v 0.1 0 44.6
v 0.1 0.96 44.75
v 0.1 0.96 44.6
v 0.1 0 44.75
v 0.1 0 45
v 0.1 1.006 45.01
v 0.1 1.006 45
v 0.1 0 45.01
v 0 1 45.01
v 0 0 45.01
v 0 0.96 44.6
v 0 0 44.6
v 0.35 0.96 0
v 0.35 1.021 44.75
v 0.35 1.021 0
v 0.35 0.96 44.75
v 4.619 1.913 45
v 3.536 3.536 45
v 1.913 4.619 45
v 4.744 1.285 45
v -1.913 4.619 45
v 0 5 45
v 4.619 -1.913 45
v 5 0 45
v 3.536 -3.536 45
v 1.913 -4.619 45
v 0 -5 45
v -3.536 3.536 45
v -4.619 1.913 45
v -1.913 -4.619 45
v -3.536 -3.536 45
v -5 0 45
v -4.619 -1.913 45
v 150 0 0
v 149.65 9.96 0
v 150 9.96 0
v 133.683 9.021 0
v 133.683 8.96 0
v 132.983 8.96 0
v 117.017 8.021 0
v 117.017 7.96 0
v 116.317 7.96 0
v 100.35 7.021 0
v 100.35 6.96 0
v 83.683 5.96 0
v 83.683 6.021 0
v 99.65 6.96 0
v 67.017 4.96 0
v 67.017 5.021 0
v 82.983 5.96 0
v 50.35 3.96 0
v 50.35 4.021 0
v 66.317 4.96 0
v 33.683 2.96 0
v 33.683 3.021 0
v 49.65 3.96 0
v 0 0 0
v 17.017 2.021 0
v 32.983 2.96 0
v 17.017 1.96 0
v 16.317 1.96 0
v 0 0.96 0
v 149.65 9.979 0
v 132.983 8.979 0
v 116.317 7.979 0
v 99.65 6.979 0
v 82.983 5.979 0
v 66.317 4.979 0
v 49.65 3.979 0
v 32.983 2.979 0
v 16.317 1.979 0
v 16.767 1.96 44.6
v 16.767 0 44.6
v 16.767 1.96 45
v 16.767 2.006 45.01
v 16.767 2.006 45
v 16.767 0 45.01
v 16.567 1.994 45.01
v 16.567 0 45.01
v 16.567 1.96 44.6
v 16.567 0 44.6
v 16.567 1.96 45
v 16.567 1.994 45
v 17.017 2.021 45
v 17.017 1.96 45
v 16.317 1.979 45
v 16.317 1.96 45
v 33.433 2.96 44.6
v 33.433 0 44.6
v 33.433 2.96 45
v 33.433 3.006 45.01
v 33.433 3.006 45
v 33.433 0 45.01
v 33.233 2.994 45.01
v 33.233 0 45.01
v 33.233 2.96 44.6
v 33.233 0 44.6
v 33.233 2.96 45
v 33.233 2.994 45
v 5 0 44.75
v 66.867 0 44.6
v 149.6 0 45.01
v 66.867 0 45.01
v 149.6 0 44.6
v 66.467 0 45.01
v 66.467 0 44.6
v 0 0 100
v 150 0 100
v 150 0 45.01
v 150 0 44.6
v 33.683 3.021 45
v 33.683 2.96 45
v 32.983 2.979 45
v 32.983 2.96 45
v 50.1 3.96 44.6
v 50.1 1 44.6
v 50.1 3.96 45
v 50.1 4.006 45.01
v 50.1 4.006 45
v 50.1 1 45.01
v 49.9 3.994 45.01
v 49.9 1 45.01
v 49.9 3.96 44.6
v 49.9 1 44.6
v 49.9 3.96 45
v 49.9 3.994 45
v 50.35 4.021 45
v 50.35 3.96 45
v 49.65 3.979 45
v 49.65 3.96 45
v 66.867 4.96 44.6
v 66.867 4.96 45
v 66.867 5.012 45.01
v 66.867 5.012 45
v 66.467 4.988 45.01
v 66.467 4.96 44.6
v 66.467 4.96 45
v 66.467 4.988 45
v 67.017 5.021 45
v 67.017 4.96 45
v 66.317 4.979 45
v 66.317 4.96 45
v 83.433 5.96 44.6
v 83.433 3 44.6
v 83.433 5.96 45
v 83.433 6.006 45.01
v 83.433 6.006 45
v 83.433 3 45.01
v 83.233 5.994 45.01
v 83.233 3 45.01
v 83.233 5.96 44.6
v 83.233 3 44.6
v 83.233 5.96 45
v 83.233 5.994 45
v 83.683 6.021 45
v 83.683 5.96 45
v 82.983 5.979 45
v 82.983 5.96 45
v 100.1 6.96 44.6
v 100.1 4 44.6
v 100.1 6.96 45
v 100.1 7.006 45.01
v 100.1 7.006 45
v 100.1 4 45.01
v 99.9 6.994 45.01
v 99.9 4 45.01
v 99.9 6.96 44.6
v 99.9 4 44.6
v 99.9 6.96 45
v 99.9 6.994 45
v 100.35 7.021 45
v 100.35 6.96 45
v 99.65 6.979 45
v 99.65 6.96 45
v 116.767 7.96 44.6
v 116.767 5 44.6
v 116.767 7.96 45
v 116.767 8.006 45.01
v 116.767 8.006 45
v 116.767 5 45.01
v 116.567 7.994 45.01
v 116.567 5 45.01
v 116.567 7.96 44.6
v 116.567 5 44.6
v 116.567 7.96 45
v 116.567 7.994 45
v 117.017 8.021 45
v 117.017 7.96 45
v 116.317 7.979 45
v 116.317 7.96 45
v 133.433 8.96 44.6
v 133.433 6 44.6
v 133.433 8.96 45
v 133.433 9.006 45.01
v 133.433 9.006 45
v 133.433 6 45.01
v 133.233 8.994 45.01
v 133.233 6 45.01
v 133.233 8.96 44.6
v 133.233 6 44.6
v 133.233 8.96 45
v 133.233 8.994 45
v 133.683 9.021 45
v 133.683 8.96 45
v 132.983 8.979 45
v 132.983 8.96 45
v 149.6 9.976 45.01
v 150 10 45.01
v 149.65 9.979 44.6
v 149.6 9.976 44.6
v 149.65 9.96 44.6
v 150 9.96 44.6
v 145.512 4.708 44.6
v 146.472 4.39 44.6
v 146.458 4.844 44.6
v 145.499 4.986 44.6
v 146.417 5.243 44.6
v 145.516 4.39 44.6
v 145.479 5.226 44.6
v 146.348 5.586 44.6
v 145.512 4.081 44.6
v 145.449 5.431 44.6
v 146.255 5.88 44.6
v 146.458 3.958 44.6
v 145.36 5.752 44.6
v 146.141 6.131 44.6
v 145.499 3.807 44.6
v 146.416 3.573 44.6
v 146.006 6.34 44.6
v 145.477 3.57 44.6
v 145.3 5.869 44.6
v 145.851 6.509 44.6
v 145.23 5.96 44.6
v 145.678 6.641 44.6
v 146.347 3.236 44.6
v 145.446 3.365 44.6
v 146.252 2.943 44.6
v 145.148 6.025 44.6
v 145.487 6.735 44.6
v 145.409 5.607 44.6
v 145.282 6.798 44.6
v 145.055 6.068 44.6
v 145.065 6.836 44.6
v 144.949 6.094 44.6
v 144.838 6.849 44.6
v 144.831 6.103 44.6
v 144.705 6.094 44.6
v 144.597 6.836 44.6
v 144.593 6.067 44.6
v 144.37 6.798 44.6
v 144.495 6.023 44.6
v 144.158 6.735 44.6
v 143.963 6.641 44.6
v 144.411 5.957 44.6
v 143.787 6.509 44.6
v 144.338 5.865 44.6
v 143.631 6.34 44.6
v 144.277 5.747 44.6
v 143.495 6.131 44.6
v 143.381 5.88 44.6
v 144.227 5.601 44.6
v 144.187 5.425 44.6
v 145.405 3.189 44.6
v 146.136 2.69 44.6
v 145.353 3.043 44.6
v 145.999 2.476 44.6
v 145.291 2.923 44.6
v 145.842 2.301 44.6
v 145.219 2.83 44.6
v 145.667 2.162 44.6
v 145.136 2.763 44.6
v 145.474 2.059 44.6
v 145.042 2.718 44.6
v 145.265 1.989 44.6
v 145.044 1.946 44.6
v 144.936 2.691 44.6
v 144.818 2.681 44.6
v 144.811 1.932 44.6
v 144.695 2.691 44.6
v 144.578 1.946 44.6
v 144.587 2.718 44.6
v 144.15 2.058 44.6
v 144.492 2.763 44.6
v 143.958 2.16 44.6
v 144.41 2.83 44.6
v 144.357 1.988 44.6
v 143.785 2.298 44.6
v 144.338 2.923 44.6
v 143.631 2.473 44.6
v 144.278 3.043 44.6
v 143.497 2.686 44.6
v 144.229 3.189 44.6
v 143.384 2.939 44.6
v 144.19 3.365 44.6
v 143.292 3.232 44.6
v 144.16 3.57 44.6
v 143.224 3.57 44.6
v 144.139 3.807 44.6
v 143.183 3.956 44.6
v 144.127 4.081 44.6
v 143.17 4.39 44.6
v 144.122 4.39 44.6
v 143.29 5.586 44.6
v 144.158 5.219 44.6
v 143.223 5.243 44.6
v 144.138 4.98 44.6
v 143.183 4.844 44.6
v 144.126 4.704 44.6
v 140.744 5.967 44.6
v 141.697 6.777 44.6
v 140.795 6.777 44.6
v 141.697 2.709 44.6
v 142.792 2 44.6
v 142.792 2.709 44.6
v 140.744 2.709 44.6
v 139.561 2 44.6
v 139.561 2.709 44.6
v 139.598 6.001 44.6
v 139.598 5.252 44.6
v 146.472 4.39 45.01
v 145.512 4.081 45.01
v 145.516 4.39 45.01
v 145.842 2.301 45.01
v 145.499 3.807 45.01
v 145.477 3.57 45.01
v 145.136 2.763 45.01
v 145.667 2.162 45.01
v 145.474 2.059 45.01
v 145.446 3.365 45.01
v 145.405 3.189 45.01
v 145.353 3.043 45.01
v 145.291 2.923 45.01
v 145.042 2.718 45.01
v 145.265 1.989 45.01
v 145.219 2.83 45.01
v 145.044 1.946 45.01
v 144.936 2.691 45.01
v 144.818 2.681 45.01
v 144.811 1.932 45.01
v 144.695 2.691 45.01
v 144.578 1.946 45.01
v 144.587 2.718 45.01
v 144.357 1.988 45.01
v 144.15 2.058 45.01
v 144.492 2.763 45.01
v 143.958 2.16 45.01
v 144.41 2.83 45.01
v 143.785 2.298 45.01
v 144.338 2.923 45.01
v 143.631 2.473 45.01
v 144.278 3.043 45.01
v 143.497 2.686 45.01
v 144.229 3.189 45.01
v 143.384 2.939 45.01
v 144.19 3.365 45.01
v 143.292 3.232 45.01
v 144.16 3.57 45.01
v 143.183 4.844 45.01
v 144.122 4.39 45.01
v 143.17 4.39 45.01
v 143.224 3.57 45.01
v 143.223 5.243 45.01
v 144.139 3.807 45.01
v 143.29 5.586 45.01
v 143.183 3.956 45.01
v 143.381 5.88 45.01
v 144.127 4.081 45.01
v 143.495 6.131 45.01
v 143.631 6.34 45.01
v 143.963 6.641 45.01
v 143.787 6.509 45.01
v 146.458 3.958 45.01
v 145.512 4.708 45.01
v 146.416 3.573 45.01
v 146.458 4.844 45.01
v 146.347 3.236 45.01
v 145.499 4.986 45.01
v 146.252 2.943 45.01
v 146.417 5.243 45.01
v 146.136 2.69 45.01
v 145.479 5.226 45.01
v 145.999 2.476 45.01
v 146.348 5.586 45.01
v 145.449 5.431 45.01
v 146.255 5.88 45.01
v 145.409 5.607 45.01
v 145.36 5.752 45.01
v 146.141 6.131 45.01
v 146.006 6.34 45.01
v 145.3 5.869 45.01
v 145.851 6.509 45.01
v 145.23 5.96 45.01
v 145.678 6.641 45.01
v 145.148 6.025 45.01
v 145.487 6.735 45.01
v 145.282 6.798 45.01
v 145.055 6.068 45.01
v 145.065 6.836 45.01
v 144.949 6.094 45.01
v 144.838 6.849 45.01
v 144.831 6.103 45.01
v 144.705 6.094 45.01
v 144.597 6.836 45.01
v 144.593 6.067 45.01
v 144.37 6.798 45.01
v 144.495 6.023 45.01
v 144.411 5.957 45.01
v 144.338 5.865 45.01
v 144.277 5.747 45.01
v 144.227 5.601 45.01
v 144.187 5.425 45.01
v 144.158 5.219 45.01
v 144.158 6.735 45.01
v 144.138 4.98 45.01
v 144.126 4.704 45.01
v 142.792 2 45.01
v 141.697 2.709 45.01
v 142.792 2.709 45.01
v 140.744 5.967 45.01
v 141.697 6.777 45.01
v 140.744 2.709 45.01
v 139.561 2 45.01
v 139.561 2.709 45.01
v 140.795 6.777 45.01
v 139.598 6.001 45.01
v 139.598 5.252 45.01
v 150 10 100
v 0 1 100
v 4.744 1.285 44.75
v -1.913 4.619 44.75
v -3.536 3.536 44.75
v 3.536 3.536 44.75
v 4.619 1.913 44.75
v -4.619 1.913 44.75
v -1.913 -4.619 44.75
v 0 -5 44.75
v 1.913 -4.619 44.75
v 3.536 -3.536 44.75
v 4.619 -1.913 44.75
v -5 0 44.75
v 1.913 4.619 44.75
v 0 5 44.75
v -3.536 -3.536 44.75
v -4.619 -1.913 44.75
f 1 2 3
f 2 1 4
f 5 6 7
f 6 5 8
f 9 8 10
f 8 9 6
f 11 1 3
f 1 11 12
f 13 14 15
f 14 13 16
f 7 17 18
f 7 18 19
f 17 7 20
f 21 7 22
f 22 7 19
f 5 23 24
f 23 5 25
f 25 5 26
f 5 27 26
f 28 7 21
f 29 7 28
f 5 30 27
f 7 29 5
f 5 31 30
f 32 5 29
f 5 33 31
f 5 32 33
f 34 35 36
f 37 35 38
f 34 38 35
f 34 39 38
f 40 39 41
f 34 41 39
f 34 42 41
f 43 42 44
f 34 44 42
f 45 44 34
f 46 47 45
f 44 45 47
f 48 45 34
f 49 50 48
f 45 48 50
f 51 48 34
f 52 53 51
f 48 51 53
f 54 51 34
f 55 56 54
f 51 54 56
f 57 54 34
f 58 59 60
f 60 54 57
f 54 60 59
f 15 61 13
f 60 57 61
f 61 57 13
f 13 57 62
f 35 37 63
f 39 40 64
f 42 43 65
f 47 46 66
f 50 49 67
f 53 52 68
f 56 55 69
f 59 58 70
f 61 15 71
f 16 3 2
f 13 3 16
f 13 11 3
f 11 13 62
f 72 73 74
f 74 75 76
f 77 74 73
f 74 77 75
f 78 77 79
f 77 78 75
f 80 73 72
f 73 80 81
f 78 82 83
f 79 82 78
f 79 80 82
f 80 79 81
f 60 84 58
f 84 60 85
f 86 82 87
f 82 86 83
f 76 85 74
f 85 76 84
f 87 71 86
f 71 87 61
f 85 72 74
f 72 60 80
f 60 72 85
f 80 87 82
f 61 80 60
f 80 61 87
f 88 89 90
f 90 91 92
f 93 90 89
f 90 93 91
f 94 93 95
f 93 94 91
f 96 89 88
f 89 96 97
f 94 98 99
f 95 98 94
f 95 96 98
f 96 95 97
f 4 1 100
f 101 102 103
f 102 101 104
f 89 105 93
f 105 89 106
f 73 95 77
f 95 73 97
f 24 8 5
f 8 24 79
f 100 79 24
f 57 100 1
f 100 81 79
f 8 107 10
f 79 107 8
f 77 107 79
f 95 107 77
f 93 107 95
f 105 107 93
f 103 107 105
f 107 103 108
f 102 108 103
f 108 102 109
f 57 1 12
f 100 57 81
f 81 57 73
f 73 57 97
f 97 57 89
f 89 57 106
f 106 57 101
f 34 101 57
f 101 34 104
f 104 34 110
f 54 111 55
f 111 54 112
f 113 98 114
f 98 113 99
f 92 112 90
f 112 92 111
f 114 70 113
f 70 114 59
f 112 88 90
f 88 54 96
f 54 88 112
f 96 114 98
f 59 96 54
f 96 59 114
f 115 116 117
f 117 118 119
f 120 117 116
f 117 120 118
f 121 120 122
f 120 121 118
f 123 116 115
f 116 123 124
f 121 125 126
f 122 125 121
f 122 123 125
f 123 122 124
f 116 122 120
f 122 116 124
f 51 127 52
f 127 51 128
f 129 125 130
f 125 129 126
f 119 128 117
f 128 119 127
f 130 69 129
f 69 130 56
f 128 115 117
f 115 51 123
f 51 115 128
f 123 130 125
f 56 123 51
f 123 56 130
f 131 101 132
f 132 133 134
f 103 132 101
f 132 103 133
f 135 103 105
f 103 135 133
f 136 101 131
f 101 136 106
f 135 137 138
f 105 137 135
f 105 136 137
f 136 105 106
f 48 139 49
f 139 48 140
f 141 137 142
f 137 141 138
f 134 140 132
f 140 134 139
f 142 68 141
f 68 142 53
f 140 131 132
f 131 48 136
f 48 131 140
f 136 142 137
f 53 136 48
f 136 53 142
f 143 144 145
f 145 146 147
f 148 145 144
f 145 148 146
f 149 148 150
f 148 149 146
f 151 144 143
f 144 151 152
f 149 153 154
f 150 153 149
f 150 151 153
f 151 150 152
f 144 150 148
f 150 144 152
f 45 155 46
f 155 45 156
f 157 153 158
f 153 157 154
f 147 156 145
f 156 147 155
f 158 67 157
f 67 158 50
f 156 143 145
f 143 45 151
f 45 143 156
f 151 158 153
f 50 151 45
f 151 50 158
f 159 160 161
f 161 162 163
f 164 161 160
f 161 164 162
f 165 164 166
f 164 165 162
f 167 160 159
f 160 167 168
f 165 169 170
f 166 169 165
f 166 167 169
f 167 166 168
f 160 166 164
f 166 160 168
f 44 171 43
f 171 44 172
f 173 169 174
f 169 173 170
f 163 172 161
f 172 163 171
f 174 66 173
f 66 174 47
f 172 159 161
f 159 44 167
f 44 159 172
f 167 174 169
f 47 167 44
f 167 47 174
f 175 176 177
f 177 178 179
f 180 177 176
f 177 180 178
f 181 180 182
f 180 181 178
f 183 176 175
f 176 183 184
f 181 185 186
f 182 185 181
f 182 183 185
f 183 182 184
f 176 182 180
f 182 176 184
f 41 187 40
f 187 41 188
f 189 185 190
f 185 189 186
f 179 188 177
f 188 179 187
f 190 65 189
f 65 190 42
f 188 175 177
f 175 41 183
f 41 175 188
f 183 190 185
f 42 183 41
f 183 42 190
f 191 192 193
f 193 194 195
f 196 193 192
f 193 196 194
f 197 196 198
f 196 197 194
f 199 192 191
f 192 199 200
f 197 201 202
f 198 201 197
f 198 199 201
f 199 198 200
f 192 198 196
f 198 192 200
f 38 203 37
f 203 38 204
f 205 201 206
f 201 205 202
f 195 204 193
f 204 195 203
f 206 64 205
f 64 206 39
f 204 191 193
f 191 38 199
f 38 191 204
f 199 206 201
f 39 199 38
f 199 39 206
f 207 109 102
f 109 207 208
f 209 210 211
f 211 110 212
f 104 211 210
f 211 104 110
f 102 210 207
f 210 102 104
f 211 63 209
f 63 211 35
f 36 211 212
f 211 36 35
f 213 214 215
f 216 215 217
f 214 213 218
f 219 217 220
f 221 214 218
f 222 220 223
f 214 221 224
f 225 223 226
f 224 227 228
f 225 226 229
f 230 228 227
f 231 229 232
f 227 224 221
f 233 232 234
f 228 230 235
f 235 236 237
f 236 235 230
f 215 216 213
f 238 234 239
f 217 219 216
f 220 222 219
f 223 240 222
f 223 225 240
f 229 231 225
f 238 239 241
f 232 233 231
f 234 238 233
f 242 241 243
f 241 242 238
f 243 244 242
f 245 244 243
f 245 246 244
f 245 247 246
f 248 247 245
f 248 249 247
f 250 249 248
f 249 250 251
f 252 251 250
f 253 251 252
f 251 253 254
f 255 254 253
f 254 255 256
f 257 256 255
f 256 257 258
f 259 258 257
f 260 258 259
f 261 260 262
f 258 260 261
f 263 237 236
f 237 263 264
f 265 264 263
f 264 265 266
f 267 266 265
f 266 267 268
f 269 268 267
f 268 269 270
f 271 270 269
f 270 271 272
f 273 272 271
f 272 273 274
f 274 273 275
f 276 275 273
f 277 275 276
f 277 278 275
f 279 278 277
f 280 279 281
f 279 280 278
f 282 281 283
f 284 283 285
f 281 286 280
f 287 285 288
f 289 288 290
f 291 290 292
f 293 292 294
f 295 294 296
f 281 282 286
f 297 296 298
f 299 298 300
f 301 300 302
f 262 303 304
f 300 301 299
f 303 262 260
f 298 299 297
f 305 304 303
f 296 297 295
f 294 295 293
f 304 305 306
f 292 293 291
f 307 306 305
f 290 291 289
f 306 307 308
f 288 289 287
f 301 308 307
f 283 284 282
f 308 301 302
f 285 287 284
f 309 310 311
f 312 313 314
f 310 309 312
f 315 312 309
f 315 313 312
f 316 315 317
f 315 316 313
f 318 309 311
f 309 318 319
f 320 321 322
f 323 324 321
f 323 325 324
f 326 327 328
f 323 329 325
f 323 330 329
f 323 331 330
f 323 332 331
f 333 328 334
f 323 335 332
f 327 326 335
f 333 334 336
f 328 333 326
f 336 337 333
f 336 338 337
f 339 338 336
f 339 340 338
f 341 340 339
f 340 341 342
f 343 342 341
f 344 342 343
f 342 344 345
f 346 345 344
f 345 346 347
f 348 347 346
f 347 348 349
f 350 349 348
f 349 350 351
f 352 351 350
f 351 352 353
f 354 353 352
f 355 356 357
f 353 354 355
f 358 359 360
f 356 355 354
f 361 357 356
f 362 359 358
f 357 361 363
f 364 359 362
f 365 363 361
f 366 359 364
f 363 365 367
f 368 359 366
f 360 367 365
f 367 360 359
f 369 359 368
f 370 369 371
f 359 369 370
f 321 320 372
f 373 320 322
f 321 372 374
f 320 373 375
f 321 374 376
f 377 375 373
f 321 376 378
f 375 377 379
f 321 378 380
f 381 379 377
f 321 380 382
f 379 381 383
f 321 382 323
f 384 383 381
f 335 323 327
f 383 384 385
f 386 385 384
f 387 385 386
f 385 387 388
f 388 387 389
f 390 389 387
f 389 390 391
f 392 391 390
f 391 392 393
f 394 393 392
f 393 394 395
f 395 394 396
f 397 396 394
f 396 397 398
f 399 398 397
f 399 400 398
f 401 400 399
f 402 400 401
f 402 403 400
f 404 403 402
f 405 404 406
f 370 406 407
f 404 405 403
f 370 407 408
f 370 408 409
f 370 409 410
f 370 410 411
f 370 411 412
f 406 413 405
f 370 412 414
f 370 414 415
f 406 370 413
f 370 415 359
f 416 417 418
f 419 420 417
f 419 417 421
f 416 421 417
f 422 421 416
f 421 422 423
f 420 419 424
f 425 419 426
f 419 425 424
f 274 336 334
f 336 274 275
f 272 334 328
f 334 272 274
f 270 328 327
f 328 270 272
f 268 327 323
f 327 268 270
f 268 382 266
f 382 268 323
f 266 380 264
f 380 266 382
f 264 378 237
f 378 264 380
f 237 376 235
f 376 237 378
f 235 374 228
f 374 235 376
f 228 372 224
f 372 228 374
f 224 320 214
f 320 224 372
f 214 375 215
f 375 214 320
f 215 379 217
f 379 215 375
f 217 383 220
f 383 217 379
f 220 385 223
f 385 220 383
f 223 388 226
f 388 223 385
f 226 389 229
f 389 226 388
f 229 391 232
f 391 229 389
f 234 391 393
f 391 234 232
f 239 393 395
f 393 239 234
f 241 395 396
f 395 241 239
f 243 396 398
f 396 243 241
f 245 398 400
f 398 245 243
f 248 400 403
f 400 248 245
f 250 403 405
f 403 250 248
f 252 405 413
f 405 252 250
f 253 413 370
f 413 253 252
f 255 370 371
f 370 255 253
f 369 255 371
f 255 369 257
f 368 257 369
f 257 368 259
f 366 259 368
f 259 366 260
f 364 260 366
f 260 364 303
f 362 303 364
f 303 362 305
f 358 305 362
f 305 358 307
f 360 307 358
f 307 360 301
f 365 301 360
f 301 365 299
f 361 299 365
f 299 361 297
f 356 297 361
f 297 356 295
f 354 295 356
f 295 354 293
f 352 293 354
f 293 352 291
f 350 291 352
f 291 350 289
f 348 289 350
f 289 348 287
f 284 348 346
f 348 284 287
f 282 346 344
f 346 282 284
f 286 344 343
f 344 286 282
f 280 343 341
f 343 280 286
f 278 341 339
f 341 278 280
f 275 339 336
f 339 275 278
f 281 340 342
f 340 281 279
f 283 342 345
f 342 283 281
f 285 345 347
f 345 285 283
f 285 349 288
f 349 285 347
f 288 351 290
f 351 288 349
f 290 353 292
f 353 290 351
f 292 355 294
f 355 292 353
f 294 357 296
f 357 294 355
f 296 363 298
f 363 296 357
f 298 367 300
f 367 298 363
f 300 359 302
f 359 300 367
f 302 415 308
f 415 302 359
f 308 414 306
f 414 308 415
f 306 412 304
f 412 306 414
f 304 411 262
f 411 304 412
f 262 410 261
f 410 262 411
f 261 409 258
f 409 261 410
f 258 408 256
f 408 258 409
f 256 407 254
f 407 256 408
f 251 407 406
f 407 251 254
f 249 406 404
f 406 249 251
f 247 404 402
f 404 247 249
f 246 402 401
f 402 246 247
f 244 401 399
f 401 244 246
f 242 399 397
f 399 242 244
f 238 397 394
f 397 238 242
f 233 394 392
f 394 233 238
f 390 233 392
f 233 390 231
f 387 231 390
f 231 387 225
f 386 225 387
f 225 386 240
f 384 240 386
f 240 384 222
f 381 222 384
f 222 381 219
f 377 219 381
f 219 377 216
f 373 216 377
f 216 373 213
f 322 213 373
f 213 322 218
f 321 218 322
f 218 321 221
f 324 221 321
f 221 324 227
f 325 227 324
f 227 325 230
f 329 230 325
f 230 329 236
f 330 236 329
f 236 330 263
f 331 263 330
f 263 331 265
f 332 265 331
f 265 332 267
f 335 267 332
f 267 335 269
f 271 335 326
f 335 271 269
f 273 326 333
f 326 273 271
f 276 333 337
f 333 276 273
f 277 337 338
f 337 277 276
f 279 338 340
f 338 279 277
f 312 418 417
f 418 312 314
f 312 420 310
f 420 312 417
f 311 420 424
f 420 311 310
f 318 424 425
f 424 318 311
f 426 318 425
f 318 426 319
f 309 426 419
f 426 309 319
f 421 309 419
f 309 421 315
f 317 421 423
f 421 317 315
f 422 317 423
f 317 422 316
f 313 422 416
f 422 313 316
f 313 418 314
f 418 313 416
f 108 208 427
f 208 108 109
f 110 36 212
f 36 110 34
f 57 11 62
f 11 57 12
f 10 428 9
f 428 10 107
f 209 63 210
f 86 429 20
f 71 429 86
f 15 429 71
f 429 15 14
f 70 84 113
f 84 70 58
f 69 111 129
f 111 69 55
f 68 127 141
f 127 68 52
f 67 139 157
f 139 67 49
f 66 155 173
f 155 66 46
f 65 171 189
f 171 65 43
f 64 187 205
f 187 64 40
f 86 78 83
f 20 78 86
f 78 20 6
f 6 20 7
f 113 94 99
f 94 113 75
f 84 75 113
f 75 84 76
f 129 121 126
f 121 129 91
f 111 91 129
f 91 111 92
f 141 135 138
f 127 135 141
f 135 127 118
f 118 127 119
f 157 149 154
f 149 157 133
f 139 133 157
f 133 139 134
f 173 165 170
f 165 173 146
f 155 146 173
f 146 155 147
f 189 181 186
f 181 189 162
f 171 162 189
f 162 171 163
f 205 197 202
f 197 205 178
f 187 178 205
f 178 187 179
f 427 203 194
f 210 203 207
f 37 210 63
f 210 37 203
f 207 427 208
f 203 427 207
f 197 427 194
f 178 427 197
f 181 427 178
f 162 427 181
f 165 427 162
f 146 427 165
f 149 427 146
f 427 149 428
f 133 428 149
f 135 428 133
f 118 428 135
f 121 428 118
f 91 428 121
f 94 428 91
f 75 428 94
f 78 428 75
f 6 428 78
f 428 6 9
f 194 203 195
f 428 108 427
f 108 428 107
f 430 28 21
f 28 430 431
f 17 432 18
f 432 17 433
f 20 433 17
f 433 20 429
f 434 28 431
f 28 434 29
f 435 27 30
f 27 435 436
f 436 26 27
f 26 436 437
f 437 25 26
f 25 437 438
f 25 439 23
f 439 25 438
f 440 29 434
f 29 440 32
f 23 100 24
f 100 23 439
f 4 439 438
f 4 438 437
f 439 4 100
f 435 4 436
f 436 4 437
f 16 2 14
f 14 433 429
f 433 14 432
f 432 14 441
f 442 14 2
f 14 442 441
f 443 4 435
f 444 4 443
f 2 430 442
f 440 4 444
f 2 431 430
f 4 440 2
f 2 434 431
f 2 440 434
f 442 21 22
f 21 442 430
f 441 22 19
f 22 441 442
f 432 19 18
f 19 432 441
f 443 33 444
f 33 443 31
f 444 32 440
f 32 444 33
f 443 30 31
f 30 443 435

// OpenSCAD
e=0.01;

len = 150;
width=45;
height = 10;
min_height=1;

module foot() {
  cylinder(r=5, h=0.25);
}

module measure_row(over_range=len, tap_offset=5, mini_offset=8) {
  emboss=0.4;
  x_per_mm = over_range / (height - min_height);
  for (i = [min_height:height]) {
    // Measure lines side
    xoffset=x_per_mm * (i - min_height);
    r = (i % 10 == 0) ? 2*emboss
      : (i % 5 == 0) ? emboss
      : emboss / 2;
    up = (i % 5 == 0) ? 0 : i - 3;
    translate([xoffset - r/2, up, -emboss]) {
      cube([r, 2*height, emboss+e]);
    }

    top_w=0.7;
    translate([xoffset-top_w/2, i-0.1*emboss, -width]) cube([top_w, 1, width]);
    // Measure text
    if (i % 10 == 0) {
      translate([xoffset - 0.2 * x_per_mm, 2, -emboss]) rotate([0, 0, 0]) linear_extrude(height=emboss+e) text(str(i), halign="right", size=min(x_per_mm * .9, height/2), font="Liberation Sans:style=Bold");
    }
  }
}

difference() {
  color("blue") linear_extrude(h=width) polygon([[0, 0], [0, min_height], [len, height], [len, 0]]);
  translate([0, 0, width]) measure_row();
}

translate([0, 0, width-0.25]) foot();
